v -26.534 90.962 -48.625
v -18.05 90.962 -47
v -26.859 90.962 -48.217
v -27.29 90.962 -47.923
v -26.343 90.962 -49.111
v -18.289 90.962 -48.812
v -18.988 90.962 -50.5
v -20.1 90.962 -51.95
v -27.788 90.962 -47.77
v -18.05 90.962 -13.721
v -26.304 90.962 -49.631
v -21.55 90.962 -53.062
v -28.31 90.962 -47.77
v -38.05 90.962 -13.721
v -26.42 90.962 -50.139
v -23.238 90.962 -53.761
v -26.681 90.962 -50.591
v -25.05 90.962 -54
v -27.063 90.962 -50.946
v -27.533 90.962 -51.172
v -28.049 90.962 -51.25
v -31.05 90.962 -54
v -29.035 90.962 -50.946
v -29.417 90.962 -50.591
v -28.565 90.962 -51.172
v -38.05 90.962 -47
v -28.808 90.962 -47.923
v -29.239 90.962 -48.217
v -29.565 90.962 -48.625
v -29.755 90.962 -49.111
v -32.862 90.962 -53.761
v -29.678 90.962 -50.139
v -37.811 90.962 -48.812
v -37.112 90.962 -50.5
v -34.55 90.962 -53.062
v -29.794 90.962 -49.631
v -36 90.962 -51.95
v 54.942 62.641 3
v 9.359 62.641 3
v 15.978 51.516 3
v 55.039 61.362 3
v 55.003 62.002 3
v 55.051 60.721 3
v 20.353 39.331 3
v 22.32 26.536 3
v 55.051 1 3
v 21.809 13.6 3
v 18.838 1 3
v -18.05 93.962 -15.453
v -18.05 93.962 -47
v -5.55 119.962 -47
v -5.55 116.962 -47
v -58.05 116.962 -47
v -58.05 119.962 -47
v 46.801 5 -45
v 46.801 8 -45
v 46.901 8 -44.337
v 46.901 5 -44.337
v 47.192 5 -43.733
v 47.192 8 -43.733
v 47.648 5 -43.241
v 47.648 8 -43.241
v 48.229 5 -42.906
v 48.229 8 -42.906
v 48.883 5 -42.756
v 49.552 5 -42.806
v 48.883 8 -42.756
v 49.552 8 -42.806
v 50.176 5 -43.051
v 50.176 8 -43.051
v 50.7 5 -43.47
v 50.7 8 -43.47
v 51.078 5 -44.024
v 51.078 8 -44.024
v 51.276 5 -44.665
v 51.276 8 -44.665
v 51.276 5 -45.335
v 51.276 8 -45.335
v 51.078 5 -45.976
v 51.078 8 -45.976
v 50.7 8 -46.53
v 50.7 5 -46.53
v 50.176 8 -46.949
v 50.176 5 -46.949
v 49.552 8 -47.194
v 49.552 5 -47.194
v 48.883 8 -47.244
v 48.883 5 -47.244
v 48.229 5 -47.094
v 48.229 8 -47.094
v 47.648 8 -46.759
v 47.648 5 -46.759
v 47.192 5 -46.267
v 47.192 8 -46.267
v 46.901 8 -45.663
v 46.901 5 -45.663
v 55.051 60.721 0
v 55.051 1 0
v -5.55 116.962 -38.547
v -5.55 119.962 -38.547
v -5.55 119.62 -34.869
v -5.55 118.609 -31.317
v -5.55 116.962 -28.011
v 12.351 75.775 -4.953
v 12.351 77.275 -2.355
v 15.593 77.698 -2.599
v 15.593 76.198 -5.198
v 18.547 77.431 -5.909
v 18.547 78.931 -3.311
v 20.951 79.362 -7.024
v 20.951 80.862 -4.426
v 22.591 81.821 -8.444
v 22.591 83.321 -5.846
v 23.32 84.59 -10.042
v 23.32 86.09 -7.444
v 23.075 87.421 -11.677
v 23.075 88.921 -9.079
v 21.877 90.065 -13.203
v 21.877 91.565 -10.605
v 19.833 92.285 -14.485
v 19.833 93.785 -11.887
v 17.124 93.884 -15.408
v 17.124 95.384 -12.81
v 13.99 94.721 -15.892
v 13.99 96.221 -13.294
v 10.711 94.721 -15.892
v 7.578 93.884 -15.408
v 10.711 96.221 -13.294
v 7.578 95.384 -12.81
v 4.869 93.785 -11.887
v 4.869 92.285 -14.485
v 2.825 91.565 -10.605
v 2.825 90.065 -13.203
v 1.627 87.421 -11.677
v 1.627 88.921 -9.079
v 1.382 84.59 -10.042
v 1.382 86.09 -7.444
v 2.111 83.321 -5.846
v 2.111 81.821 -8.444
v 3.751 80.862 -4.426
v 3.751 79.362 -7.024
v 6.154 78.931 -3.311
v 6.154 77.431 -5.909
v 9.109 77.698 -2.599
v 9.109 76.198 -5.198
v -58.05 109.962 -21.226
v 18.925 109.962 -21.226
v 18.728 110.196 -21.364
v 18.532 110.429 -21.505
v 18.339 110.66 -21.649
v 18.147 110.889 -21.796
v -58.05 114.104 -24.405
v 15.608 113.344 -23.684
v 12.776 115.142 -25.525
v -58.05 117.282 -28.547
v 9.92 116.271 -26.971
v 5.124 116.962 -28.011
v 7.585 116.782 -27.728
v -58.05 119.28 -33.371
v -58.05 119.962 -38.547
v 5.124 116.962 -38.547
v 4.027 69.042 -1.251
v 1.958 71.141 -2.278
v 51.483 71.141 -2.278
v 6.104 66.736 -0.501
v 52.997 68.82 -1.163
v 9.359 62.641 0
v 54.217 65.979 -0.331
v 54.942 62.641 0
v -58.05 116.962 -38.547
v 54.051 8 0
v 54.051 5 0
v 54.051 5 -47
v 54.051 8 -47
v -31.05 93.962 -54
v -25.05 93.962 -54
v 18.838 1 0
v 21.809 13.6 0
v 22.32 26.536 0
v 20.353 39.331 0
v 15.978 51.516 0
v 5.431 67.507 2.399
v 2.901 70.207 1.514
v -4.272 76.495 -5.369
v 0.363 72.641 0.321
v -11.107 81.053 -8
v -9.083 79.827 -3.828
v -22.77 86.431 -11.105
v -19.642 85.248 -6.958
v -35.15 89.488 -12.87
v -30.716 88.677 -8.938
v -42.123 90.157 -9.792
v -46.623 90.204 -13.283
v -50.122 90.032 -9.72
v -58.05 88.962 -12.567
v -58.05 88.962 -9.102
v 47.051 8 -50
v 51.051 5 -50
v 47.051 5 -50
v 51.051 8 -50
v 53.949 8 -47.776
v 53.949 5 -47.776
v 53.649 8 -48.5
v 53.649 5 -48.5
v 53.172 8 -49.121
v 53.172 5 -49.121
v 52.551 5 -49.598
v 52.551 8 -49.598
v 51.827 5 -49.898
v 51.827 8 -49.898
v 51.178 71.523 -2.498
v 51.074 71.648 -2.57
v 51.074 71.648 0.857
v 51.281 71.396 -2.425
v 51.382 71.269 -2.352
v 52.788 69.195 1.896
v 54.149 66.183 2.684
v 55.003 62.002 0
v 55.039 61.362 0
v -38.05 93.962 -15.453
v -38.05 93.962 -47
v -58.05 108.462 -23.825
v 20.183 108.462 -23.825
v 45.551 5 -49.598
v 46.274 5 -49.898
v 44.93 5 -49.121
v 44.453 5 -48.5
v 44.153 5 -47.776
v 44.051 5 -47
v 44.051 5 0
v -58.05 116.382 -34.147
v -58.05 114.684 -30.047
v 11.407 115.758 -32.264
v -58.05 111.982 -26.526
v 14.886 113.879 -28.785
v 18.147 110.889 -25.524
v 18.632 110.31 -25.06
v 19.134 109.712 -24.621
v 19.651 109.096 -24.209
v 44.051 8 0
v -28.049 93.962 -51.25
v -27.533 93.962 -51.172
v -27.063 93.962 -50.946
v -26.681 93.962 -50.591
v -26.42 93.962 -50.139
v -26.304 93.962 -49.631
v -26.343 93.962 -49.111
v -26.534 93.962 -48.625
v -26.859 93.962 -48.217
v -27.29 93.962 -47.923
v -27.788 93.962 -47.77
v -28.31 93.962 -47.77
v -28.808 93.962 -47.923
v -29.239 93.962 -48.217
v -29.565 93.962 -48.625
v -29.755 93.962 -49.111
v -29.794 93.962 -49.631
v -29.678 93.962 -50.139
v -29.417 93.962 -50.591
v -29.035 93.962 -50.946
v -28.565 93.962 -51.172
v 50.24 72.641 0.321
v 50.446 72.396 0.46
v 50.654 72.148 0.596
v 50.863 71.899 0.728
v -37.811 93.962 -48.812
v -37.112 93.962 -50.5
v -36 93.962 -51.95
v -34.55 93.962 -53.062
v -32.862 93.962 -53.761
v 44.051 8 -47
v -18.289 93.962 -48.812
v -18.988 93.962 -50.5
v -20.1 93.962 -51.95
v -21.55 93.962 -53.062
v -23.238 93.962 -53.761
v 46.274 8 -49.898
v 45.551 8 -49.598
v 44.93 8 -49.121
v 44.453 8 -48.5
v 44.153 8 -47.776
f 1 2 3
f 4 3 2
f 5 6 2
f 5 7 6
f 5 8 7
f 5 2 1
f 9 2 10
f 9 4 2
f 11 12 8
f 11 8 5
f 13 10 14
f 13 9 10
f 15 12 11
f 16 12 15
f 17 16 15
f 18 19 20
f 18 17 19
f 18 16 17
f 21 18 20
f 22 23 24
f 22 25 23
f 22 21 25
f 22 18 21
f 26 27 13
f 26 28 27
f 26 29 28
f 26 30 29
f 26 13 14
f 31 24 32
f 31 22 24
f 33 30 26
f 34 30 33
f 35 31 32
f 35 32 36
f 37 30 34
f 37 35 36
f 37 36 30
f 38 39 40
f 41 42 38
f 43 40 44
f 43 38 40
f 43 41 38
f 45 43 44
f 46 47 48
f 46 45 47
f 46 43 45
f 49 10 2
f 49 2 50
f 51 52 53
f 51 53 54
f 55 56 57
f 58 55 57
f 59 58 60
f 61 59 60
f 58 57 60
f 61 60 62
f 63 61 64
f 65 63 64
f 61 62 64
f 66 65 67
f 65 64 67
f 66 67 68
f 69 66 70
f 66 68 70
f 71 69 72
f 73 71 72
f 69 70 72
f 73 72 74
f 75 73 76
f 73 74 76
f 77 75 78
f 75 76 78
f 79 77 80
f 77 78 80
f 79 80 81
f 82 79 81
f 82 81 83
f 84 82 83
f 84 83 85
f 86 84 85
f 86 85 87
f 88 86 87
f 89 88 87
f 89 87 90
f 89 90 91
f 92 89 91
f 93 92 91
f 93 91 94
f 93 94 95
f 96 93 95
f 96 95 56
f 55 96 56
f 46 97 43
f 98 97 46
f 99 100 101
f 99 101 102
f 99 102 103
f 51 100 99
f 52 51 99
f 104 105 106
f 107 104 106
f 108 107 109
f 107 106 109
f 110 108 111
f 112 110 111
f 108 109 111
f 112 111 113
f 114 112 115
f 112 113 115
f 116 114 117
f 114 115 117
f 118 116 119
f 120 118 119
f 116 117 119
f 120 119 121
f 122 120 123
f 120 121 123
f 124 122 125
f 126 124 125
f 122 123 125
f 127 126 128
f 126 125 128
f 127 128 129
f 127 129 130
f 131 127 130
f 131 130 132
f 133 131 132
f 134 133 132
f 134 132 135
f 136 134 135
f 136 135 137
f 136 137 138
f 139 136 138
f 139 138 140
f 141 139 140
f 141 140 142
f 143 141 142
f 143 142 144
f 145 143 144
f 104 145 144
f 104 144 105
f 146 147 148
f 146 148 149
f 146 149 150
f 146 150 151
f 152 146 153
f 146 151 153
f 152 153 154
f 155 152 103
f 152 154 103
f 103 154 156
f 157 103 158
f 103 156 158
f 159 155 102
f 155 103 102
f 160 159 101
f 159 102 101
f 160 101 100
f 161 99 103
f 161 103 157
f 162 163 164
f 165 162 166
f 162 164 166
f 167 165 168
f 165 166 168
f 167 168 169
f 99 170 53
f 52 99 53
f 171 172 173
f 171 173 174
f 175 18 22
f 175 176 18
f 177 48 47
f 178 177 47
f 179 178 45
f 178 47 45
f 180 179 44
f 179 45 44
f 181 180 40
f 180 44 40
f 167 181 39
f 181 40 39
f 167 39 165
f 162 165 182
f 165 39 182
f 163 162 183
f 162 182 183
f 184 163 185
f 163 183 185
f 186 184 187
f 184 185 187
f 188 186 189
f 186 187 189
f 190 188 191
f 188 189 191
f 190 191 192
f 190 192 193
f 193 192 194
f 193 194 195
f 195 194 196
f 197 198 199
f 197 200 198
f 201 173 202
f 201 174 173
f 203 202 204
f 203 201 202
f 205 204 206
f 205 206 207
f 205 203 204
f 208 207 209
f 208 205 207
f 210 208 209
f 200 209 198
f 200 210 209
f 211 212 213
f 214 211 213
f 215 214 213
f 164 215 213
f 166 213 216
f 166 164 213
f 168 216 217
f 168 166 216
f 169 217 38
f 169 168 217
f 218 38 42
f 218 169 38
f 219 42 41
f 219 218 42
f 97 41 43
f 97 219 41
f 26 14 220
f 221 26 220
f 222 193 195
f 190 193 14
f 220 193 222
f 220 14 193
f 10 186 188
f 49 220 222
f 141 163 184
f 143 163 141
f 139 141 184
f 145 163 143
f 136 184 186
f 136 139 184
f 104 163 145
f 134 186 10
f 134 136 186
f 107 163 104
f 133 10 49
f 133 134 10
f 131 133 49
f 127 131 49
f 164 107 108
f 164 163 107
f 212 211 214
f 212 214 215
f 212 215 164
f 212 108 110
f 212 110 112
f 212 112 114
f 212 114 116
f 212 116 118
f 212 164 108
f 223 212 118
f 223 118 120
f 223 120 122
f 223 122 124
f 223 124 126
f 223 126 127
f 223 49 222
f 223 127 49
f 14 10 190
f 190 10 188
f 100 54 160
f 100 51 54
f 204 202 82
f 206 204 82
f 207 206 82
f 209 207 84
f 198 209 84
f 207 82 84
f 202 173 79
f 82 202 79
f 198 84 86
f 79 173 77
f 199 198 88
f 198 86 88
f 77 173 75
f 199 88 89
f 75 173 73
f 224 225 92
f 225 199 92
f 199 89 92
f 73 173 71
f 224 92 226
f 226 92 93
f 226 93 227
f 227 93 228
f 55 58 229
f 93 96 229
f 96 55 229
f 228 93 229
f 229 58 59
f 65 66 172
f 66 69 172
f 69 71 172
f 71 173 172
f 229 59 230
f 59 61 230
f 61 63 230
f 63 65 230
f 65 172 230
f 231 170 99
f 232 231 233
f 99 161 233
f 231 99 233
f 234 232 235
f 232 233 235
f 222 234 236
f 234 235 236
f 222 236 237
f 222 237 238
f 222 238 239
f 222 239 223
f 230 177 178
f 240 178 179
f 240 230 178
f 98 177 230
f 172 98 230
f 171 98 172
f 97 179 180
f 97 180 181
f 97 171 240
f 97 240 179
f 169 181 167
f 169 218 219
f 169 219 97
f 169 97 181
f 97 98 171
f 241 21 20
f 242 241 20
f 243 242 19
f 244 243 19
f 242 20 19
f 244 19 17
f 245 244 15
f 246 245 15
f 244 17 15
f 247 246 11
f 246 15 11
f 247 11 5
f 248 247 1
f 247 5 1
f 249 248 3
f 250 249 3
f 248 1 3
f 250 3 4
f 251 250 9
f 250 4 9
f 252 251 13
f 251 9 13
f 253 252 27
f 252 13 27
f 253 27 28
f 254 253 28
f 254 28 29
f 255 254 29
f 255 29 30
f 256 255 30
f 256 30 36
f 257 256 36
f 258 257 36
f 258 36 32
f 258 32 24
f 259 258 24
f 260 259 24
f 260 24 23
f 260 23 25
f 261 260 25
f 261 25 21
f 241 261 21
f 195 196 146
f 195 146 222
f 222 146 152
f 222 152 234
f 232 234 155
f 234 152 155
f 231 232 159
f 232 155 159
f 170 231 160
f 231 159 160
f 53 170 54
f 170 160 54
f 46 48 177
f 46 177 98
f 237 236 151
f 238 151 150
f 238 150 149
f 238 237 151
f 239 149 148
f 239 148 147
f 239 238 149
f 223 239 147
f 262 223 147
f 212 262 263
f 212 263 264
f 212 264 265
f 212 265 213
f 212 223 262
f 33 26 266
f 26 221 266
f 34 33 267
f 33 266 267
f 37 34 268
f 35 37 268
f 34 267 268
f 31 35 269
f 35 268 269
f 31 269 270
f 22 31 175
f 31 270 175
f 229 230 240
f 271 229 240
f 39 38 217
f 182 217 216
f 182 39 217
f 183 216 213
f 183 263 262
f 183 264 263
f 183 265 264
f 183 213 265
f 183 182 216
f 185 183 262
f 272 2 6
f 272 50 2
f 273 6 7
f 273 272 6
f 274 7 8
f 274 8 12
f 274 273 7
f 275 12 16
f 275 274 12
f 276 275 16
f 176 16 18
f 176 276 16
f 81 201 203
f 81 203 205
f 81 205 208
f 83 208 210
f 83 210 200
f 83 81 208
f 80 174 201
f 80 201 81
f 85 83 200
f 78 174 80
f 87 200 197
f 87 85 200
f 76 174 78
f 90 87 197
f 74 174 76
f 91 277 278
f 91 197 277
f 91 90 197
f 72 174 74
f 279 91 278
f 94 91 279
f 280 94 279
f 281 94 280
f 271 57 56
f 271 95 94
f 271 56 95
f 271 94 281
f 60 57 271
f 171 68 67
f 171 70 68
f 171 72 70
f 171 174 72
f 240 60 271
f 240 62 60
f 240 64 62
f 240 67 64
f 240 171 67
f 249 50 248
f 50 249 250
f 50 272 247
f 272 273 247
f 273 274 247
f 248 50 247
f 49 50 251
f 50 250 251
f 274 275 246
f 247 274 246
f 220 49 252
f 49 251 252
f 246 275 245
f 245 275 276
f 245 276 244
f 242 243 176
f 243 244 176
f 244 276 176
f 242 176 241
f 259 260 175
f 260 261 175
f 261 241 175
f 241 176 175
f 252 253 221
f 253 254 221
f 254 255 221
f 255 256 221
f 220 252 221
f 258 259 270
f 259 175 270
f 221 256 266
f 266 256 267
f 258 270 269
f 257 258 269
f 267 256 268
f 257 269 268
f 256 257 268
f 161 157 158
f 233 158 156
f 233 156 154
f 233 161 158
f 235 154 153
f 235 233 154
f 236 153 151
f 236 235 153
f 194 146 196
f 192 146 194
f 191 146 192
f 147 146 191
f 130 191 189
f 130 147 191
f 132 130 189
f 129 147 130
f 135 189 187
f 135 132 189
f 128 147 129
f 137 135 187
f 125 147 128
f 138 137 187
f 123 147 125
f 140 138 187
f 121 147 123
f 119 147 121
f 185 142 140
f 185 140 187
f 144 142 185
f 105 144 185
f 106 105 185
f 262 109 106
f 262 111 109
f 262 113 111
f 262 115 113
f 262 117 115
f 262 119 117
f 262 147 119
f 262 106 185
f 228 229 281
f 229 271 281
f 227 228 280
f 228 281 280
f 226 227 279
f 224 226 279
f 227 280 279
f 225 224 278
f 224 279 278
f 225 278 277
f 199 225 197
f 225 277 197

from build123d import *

# Parameters (mm, degrees)
SALIENTE_EXTRUIR1_DEPTH = 58.05
REDONDEO1_R             = 20
REDONDEO2_R             = 20
REDONDEO3_R             = 17
REDONDEO4_R             = 17
CAVIDAD1_START          = -47
CAVIDAD1_DEPTH          = 50
CROQUIS8_W              = 10
CROQUIS8_H              = 3
SALIENTE_EXTRUIR2_DEPTH = 50
CROQUIS9_R              = 2.25
CORTAR_EXTRUIR6_DEPTH   = 136.665712106
SALIENTE_EXTRUIR3_REACH = 146.947
CROQUIS11_W             = 20
CROQUIS11_H             = 3
CROQUIS12_W             = 69.238292886
CROQUIS12_H             = 3
CORTAR_EXTRUIR7_DEPTH   = 1
CROQUIS15_R             = 1.75
CORTAR_EXTRUIR10_DEPTH  = 5
REDONDEO5_R             = 7
REDONDEO6_R             = 3
CROQUIS16_R             = 67.5
CORTAR_EXTRUIR11_DEPTH  = 145.946782753
CROQUIS18_R             = 11
CORTAR_EXTRUIR12_DEPTH  = 146.081609054


# Read off the part's stored shape, not the designer's step: Cavidad1
with BuildPart() as part:
    # Croquis1 → Saliente-Extruir1 (new, symmetric)
    with BuildSketch(Plane(origin=(0, 0, 0), x_dir=(0, 0, -1), z_dir=(1, 0, 0))):
        Polygon((0, 0), (0, 67.196152423), (28.732050808, 116.961524227), (47, 116.961524227), (47, 119.961524227), (27, 119.961524227), (-3, 68), (-3, 0), align=None)
    extrude(amount=SALIENTE_EXTRUIR1_DEPTH, both=True)

    # Redondeo1
    redondeo1_edges = [part.edges().sort_by_distance(p)[0] for p in [
        (0, 68, 3),
    ]]
    fillet(redondeo1_edges, radius=REDONDEO1_R)

    # Redondeo2
    redondeo2_edges = [part.edges().sort_by_distance(p)[0] for p in [
        (0, 119.961524227, -27),
    ]]
    fillet(redondeo2_edges, radius=REDONDEO2_R)

    # Redondeo3
    redondeo3_edges = [part.edges().sort_by_distance(p)[0] for p in [
        (0, 116.961524227, -28.732050808),
    ]]
    fillet(redondeo3_edges, radius=REDONDEO3_R)

    # Redondeo4
    redondeo4_edges = [part.edges().sort_by_distance(p)[0] for p in [
        (0, 67.196152423, 0),
    ]]
    fillet(redondeo4_edges, radius=REDONDEO4_R)

    # Cavidad1 outline → Cavidad1 (cut)
    with BuildSketch(Plane.XY.offset(CAVIDAD1_START)):
        with BuildLine():
            Line((58.05, 0), (58.05, 119.961524227))
            Line((58.05, 119.961524227), (-5.55, 119.961524227))
            Line((-5.55, 119.961524227), (-5.55, 116.961524227))
            Line((-5.55, 116.961524227), (5.123846837, 116.961524227))
            ThreePointArc((5.123846837, 116.961524227), (12.308357287, 115.368756607), (18.14660237, 110.888913592))
            Line((18.14660237, 110.888913592), (51.073651347, 71.647984679))
            ThreePointArc((51.073651347, 71.647984679), (54.025670368, 66.534937751), (55.050895814, 60.720595315))
            Line((55.050895814, 60.720595315), (55.050895814, 0))
            Line((55.050895814, 0), (58.05, 0))
        make_face()
    extrude(amount=CAVIDAD1_DEPTH, mode=Mode.SUBTRACT)

    # Croquis8 → Saliente-Extruir2 (add)
    with BuildSketch(Plane(origin=(0, 0, 0), x_dir=(-1, 0, 0), z_dir=(0, 0, -1))):
        with Locations((-49.050895814, 6.5)):
            Rectangle(CROQUIS8_W, CROQUIS8_H)
    extrude(amount=SALIENTE_EXTRUIR2_DEPTH)

    # Croquis9 → Cortar-Extruir6 (cut, through all)
    with BuildSketch(Plane(origin=(0, 8, 0), x_dir=(1, 0, 0), z_dir=(0, 1, 0))):
        with Locations(Location((49.050895814, 45, 0), (0, 0, 180))):
            Circle(CROQUIS9_R)
    extrude(amount=-CORTAR_EXTRUIR6_DEPTH, mode=Mode.SUBTRACT)

    # Saliente-Extruir3: up to this plane
    saliente_extruir3_end = Plane(origin=(58.05, 67.196152423, 0), z_dir=(0, 0.49999999999999767, 0.86602540378444))
    # Croquis11 → Saliente-Extruir3 (add, up to the surface)
    with BuildSketch(Plane(origin=(0, 0, -54), x_dir=(-1, 0, 0), z_dir=(0, 0, -1)), mode=Mode.PRIVATE) as saliente_extruir3_sk1:
        with Locations((28.05, 92.461524227)):
            Rectangle(CROQUIS11_W, CROQUIS11_H)
    saliente_extruir3_tool1 = split(extrude(saliente_extruir3_sk1.sketch, amount=-SALIENTE_EXTRUIR3_REACH, mode=Mode.PRIVATE), bisect_by=saliente_extruir3_end, keep=Keep.BOTH, mode=Mode.PRIVATE)
    add(saliente_extruir3_tool1.solids().sort_by_distance((-28.05, 92.461524, -54))[0])

    # Croquis12 → Cortar-Extruir7 (cut)
    with BuildSketch(Plane.XZ):
        with Locations((20.431749371, 1.5)):
            Rectangle(CROQUIS12_W, CROQUIS12_H)
    extrude(amount=-CORTAR_EXTRUIR7_DEPTH, mode=Mode.SUBTRACT)

    # Croquis15 → Cortar-Extruir10 (cut)
    with BuildSketch(Plane.XZ.offset(-90.961524227)):
        with Locations(Location((-28.049104186, -49.5, 0), (0, 0, 270))):
            Circle(CROQUIS15_R)
    extrude(amount=-CORTAR_EXTRUIR10_DEPTH, mode=Mode.SUBTRACT)

    # Redondeo5
    redondeo5_edges = [part.edges().sort_by_distance(p)[0] for p in [
        (-18.05, 92.461524227, -54),
        (-38.05, 92.461524227, -54),
    ]]
    fillet(redondeo5_edges, radius=REDONDEO5_R)

    # Redondeo6
    redondeo6_edges = [part.edges().sort_by_distance(p)[0] for p in [
        (54.050895814, 6.5, -50),
        (44.050895814, 6.5, -50),
    ]]
    fillet(redondeo6_edges, radius=REDONDEO6_R)

    # Croquis16 → Cortar-Extruir11 (cut, through all)
    with BuildSketch(Plane.XY.offset(3)):
        with Locations((-45.071920691, 22.721524227)):
            Circle(CROQUIS16_R)
    extrude(amount=-CORTAR_EXTRUIR11_DEPTH, mode=Mode.SUBTRACT)

    # Croquis18 → Cortar-Extruir12 (cut, through all)
    with BuildSketch(Plane(origin=(0, 18.299038106, 31.694863729), x_dir=(1, 0, 0), z_dir=(0, 0.4999999999999976, 0.86602540378444))):
        with Locations(Location((12.350895814, 79.099876042, 0), (0, 0, 270))):
            Circle(CROQUIS18_R)
    extrude(amount=-CORTAR_EXTRUIR12_DEPTH, mode=Mode.SUBTRACT)


solid = part.part
